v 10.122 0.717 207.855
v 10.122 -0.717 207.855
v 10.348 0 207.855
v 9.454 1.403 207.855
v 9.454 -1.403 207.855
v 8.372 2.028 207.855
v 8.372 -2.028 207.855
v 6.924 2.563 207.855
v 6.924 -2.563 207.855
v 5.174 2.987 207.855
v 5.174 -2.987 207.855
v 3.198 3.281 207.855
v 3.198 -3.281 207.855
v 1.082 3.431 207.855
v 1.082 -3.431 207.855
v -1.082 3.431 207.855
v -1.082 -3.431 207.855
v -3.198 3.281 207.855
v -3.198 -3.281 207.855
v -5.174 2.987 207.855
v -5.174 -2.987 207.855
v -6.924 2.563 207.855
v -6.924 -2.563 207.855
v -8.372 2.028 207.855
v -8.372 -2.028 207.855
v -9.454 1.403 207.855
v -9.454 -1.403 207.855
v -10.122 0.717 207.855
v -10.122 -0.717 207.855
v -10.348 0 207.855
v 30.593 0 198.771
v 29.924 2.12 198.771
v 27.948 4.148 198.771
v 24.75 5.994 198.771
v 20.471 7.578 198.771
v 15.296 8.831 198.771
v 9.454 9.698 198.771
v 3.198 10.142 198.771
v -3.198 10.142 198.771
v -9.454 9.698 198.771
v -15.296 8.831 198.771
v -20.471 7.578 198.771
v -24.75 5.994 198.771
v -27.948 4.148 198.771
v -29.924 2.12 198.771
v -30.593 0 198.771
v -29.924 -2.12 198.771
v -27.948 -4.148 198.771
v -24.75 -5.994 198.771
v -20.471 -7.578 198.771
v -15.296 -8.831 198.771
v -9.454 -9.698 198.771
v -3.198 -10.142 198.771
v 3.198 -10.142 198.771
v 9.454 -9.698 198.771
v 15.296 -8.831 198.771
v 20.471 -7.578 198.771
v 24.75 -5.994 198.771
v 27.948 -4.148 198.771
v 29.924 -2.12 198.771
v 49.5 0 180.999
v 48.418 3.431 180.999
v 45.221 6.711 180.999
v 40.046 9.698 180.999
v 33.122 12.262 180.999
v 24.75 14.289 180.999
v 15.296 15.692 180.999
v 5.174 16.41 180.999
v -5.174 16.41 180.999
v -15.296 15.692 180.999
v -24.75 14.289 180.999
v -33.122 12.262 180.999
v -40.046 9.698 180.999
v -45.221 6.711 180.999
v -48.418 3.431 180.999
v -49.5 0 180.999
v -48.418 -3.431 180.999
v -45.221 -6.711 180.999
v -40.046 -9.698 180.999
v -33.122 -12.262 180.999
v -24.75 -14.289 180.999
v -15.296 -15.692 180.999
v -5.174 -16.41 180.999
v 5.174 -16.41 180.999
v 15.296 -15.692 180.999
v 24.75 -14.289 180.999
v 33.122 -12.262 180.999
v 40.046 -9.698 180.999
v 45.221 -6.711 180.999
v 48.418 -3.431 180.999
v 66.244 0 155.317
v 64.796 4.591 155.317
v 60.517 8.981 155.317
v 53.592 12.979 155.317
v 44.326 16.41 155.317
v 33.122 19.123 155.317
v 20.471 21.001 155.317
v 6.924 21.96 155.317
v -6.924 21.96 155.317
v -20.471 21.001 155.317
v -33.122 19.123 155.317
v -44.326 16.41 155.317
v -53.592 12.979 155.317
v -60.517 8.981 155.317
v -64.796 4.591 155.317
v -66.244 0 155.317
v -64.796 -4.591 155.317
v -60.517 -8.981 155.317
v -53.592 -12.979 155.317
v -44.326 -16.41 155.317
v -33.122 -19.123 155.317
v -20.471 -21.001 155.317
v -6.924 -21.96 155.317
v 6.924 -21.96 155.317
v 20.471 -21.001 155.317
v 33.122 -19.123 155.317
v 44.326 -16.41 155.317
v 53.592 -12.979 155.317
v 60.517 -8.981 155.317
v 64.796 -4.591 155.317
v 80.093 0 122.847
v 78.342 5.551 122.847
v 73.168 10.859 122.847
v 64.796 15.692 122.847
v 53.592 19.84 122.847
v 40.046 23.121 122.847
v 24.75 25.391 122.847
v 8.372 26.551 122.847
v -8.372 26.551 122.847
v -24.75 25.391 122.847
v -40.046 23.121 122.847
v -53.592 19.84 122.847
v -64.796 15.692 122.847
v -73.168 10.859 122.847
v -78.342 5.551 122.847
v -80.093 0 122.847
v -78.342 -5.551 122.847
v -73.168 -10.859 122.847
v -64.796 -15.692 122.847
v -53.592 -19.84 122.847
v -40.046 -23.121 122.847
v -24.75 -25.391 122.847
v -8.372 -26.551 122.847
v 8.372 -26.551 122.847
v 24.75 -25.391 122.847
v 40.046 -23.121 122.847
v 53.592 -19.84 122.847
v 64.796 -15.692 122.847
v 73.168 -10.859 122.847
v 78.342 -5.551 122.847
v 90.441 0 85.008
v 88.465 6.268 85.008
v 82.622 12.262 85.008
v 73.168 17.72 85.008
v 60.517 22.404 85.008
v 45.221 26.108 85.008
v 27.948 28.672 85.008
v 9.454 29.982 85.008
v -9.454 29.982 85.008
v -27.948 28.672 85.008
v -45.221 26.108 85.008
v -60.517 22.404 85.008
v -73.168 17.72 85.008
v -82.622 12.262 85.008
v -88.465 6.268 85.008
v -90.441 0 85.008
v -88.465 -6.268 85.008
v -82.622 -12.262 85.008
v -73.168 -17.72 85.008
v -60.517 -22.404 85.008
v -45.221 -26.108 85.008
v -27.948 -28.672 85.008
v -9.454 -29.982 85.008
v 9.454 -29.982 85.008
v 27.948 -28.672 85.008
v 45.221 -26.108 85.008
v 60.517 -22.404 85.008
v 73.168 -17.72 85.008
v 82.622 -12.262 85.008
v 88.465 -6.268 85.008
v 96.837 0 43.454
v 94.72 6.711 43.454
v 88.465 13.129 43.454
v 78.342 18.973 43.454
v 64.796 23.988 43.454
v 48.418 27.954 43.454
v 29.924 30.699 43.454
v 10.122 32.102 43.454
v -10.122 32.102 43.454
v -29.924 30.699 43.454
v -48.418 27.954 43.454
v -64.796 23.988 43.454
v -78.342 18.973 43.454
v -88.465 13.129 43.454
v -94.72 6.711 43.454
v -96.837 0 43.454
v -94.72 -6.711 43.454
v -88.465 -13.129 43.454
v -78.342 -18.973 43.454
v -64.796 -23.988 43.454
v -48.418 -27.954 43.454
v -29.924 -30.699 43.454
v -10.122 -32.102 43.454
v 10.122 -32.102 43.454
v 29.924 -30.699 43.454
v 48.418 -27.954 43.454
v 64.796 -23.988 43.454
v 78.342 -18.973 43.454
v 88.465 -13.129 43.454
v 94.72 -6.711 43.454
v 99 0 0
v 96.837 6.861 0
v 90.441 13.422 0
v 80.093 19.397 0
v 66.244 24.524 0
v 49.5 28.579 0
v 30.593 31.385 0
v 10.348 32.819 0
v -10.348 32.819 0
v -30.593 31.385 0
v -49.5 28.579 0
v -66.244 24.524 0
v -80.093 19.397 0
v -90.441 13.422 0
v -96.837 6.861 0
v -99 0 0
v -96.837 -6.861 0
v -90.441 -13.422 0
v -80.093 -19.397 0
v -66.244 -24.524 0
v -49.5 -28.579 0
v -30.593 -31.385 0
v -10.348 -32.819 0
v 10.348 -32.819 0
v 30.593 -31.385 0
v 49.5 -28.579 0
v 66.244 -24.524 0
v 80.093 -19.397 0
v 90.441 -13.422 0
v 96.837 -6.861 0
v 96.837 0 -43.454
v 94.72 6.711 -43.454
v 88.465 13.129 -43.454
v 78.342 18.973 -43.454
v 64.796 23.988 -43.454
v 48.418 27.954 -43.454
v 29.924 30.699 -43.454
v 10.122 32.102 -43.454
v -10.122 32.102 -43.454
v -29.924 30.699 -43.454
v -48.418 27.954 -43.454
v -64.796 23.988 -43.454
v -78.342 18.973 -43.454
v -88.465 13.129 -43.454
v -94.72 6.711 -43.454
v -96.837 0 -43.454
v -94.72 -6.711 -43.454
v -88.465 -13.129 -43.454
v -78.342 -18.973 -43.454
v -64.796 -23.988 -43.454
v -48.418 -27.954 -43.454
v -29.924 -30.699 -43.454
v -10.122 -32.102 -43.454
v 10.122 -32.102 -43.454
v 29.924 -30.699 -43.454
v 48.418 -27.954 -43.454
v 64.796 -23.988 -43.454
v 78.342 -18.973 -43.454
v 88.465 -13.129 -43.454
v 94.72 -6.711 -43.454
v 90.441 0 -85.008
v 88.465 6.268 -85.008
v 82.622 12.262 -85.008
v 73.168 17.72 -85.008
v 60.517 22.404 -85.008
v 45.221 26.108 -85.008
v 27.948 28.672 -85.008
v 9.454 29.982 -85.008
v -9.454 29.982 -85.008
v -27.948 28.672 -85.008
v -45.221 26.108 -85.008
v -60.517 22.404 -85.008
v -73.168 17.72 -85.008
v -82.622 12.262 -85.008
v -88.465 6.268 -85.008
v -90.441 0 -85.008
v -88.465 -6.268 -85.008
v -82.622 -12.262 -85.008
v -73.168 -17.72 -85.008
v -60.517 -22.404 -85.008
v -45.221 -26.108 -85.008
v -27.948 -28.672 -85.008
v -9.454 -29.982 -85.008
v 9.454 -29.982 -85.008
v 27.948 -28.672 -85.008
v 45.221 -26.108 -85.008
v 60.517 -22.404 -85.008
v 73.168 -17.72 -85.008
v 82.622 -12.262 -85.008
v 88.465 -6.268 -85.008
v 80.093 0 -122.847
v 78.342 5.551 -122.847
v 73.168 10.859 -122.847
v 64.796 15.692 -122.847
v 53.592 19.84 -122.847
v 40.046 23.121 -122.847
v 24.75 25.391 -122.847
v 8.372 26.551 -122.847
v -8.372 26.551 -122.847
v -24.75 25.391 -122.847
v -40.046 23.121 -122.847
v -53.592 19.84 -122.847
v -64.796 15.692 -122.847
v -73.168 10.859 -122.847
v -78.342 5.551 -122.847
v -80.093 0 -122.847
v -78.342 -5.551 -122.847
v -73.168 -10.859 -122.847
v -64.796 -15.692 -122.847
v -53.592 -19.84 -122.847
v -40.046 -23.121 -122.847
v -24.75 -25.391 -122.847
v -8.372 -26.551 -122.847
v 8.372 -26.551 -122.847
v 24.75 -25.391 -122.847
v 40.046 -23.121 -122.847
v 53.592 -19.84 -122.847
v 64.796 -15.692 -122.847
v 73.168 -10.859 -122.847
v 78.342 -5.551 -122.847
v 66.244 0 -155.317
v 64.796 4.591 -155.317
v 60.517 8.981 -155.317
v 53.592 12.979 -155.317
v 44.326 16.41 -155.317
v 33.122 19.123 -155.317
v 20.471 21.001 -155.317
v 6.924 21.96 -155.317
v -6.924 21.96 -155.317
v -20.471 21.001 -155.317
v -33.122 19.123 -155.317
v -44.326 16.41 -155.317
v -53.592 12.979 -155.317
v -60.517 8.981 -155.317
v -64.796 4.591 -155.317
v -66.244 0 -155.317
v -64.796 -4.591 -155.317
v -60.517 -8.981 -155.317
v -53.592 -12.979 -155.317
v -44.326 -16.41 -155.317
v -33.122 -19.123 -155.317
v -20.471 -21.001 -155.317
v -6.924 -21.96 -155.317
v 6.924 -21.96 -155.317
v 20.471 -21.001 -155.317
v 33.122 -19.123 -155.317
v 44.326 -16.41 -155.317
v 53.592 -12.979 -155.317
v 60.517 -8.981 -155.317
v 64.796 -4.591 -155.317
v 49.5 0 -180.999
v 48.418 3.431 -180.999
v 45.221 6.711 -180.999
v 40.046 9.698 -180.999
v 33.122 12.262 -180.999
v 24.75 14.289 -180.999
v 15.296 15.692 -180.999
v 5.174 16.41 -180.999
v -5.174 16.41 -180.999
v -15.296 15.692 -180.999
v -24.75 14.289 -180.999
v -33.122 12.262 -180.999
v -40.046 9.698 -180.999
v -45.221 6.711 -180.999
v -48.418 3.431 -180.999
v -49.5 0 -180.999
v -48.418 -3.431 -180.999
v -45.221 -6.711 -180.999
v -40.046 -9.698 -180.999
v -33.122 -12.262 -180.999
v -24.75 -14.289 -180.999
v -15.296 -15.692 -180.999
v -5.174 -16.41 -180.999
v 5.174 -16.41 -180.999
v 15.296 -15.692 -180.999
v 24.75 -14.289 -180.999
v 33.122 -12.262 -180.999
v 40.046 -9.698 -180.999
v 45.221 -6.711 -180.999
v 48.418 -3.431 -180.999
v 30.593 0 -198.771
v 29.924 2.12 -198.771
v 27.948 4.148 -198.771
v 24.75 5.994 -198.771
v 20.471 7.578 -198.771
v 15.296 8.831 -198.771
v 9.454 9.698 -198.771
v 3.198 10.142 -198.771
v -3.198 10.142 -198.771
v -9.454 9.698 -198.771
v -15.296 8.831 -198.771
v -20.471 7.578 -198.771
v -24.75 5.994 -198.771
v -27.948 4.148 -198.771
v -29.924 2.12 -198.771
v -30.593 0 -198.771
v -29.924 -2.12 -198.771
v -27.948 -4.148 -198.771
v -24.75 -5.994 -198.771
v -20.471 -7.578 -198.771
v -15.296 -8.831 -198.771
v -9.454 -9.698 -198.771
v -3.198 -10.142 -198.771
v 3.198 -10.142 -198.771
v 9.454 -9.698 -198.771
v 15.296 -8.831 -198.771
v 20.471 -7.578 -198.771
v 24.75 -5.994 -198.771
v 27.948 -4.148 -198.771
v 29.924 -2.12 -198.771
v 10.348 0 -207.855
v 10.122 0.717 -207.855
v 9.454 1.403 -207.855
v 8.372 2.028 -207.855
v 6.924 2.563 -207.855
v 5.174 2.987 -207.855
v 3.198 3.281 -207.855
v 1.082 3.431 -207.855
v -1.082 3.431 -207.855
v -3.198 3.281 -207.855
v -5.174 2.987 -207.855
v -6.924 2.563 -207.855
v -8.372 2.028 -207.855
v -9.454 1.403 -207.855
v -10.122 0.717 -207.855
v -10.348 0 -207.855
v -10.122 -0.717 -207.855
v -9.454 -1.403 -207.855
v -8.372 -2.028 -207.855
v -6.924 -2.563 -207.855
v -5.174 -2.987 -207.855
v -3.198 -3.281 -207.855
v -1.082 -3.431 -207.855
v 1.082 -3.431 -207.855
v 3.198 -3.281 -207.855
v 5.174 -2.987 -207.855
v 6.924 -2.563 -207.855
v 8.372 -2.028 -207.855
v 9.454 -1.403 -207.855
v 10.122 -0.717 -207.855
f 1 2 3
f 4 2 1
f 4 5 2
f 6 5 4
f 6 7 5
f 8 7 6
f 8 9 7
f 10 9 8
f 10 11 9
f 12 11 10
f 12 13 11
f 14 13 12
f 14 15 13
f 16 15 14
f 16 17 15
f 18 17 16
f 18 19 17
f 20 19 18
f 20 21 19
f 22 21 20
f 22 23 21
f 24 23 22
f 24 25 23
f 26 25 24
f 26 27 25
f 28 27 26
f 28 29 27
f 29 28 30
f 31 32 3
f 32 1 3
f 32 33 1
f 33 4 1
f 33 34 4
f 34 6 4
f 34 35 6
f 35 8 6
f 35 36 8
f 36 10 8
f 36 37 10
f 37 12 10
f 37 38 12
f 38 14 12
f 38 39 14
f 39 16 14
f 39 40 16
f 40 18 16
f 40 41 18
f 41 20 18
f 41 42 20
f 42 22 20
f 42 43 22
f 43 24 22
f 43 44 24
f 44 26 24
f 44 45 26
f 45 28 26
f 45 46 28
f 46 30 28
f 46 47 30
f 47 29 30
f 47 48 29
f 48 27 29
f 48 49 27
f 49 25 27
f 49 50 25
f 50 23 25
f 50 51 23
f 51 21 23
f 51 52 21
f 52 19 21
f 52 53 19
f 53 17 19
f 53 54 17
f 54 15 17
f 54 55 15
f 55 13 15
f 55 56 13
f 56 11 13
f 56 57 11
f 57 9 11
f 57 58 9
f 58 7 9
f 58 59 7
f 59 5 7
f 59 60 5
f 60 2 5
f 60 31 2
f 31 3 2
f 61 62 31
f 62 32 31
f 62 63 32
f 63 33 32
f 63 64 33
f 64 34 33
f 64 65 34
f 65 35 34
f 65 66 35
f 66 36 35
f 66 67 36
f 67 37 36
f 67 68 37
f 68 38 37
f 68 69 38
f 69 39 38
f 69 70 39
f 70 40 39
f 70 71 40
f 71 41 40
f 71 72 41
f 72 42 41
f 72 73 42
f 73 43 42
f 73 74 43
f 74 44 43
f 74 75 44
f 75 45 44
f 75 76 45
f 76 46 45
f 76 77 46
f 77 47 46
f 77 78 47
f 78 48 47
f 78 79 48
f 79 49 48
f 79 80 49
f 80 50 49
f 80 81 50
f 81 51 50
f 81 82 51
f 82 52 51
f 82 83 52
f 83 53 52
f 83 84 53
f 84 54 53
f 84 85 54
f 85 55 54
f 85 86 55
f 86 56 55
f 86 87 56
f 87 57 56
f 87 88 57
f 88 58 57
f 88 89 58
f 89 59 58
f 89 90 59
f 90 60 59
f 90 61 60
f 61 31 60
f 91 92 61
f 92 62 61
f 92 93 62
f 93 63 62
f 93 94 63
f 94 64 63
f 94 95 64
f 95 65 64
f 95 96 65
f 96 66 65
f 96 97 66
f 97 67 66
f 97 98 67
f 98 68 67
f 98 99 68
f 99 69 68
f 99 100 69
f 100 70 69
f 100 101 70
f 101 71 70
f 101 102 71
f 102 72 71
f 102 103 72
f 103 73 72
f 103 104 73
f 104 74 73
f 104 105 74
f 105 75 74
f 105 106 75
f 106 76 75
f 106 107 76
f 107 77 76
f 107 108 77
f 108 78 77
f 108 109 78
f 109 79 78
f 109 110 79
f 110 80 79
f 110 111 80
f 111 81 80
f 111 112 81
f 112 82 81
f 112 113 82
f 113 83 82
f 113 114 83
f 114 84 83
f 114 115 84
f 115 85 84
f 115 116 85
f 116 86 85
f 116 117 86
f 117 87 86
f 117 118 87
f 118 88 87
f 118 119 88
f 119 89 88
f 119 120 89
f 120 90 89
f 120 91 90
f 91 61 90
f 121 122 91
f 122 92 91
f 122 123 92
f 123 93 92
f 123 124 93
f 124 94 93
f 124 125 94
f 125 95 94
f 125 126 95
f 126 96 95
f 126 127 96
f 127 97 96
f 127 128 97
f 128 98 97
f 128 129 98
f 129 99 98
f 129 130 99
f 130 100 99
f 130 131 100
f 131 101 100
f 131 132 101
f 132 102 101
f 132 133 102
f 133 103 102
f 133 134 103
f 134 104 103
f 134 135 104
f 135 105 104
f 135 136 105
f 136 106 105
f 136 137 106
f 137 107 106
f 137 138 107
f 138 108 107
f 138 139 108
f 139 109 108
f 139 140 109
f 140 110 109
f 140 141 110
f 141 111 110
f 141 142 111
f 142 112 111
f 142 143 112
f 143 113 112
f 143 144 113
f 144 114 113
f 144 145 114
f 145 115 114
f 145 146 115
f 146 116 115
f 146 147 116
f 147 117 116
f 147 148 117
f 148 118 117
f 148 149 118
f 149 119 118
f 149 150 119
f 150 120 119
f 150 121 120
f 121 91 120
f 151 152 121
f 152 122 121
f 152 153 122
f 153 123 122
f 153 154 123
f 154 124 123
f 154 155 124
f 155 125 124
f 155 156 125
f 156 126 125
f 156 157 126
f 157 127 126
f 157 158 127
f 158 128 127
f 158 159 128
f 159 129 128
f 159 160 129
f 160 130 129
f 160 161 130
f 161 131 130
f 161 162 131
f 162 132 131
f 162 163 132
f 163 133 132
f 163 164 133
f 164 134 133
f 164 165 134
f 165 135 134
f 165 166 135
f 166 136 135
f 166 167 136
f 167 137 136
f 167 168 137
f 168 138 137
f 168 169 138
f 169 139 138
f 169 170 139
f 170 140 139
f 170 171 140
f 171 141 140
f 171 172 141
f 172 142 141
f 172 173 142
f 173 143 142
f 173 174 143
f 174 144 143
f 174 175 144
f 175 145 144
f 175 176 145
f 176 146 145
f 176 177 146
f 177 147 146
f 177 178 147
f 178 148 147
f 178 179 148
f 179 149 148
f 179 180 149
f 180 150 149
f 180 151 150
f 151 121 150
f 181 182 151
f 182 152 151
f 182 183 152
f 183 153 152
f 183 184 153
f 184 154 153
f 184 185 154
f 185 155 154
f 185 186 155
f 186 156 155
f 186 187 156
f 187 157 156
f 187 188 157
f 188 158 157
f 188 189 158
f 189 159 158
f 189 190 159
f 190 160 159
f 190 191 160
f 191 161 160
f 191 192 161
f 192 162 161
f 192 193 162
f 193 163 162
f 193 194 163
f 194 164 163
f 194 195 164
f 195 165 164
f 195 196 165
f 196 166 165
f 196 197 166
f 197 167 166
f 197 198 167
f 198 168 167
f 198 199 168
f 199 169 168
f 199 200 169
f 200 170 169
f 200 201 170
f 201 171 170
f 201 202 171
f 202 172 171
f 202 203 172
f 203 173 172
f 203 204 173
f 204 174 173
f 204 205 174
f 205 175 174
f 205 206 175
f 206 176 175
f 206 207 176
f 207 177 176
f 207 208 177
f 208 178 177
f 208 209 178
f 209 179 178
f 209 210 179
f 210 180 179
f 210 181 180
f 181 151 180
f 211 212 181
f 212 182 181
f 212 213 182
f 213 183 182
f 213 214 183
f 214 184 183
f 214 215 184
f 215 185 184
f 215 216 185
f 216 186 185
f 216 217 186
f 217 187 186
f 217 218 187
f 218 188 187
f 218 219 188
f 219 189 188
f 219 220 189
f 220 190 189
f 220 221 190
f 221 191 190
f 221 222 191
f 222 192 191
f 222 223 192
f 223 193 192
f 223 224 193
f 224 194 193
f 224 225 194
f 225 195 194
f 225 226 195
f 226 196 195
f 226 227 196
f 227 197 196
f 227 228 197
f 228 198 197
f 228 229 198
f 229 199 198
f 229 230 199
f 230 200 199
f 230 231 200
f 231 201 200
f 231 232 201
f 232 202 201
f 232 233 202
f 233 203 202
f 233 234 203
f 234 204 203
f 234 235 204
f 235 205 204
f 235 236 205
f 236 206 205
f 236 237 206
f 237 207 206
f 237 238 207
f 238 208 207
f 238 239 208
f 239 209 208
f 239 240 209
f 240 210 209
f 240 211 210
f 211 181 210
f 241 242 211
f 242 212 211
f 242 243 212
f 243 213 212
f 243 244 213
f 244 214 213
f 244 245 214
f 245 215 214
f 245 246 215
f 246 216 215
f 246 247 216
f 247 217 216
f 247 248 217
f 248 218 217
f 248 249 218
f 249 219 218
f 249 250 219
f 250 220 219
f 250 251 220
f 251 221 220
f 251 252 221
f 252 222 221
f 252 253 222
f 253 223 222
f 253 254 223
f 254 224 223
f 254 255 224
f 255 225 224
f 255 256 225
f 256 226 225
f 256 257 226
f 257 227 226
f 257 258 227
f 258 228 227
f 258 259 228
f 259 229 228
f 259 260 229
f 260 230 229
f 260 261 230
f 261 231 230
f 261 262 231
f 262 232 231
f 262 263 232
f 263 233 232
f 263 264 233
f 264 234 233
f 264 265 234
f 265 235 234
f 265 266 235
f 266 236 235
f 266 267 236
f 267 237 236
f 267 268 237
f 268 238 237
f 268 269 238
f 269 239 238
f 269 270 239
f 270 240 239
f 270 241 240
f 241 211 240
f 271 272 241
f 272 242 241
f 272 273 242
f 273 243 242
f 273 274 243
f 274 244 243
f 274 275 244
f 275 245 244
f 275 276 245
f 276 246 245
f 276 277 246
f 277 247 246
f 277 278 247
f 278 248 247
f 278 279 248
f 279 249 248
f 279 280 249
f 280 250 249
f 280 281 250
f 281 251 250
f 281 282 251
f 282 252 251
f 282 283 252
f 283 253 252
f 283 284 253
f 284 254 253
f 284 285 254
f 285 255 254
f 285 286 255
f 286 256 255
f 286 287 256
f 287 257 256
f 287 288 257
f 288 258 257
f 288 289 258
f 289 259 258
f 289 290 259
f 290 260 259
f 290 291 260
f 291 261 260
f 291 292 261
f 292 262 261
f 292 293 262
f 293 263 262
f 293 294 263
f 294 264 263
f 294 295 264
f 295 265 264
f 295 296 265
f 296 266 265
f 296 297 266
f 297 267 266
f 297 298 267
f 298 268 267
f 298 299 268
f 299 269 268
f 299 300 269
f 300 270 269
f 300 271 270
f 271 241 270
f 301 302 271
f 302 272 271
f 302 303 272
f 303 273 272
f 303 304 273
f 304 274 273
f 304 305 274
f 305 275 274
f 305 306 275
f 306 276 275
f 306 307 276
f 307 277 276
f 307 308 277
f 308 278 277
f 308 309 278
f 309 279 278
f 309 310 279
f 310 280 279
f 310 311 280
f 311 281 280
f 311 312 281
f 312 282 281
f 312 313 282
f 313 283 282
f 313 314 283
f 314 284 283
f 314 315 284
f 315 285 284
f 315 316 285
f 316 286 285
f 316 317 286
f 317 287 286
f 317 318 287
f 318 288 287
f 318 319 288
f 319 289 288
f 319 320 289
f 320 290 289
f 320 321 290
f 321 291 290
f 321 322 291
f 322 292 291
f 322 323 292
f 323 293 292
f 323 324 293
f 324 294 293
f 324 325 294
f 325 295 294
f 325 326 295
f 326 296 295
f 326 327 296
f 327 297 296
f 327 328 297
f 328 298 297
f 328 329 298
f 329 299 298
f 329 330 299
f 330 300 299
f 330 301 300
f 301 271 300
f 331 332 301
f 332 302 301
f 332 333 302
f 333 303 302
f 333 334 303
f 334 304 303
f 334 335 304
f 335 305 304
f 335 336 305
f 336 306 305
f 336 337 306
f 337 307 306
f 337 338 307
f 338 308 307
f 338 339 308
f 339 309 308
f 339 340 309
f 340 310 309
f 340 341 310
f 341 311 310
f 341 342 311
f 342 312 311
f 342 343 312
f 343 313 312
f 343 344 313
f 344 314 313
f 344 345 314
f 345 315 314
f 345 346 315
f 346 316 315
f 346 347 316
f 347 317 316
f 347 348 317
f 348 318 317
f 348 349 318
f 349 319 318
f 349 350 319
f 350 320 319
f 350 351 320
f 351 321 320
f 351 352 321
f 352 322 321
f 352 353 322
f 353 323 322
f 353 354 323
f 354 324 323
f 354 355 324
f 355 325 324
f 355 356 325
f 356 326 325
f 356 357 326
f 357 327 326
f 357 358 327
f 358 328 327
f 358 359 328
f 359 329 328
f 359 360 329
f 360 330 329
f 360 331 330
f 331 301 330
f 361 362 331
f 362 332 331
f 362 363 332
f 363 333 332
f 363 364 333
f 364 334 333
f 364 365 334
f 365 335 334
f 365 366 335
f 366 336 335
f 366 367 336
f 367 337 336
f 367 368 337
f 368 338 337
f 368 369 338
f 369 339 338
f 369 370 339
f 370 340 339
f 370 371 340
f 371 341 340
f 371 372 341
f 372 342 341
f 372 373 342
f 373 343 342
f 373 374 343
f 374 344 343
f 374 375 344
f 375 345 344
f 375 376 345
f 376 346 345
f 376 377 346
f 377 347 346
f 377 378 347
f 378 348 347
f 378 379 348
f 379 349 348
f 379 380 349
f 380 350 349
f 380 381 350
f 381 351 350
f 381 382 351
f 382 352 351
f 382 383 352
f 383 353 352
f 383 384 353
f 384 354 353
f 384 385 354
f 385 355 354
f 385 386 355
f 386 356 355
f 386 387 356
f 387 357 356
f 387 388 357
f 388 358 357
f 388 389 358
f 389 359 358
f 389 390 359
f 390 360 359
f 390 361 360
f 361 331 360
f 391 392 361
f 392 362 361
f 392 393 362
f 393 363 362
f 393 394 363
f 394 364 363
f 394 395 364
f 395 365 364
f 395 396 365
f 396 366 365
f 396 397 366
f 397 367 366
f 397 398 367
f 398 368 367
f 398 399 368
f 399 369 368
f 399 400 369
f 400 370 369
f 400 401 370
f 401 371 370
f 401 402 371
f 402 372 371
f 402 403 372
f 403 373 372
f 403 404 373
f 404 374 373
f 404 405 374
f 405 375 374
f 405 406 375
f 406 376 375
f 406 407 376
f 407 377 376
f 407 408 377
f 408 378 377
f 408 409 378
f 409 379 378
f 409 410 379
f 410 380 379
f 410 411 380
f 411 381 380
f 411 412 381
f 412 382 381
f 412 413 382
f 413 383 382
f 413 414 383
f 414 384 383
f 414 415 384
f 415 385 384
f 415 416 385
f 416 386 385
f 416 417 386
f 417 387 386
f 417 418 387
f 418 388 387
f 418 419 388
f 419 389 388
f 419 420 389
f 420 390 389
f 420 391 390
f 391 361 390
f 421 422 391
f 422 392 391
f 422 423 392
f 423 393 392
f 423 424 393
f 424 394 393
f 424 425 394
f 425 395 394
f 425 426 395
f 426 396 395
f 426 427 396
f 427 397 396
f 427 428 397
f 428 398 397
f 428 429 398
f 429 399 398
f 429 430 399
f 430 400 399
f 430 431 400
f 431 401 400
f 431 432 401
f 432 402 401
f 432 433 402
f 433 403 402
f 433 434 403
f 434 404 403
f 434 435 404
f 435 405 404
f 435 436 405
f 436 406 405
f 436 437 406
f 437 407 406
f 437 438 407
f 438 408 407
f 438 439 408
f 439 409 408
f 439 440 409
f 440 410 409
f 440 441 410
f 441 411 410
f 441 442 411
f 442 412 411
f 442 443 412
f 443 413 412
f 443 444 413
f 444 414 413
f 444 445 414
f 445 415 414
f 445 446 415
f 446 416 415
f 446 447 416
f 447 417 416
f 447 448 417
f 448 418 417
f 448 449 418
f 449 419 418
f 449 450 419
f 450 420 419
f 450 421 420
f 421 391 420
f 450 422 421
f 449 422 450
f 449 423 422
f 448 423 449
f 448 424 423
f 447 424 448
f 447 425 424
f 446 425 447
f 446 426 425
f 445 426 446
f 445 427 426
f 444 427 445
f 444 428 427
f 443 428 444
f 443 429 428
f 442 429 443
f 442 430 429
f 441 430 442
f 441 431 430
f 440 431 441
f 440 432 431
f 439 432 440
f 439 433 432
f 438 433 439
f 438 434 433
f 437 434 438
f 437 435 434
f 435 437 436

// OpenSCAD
// Generated by SolidPython 1.0.1 on 2020-07-29 00:46:48


scale(v = [9, 3, 19]) {
	sphere(r = 11);
}
/***********************************************
*********      SolidPython code:      **********
************************************************
 
# import packages: SolidPython
from solid import *
from solid.utils import *
from itertools import chain, combinations, permutations


class Resize:

    def __init__(self, scad_file):
        self.scad_file = scad_file
        #self.scad_file = import_scad(scad_file)
        # cone/cylinder param:
        self.r1 = 0
        self.r2 = 0
        self.h = 0
        # rectangular prism param:
        self.w = 0
        self.l = 0
        # ellipse param:
        self.r = 0

    # import OpenScad code (file name corresponds to shape)


    # classify shape + parameters
    def assign(self, param1, param2, param3):
        if self.scad_file == 'cone.scad':
            self.r1 = param1
            self.r2 = param2
            self.h = param3
        elif self.scad_file == 'cylinder.scad':
            self.r1 = param1
            self.r2 = param2
            self.h = param3
        elif self.scad_file == 'rectangularPrism.scad':
            self.h = param1
            self.l = param2
            self.w = param3
        else:
            self.r = param1
            self.h = param2

    # resize parameters
    def iterate(self):
        x = range(3, 20, 2)
        i = 1
        if self.scad_file == 'cone.scad':
            tempList = list(permutations(x, 2))
            for temp in tempList:
                param1 = temp[0]
                param2 = temp[1]
                filepath = 'produced_scad_files/' + 'cone' + str(param1) + '_' + str(param2) + '_' + '.scad'
                scad_render_to_file(cylinder(h=param1, r1=param2, r2=0), filepath)

        elif self.scad_file == 'cylinder.scad':
            tempList = list(permutations(x, 3))
            for temp in tempList:
                param1 = temp[0]
                param2 = temp[1]
                filepath = 'produced_scad_files/' + 'cylinder' + str(param1) + '_' + str(param2) + '_' + '.scad'
                scad_render_to_file(cylinder(h=param1, r1=param2, r2=param2), filepath)

        elif self.scad_file == 'rectangularPrism.scad':
            tempList = list(permutations(x, 3))
            for temp in tempList:
                param1 = temp[0]
                param2 = temp[1]
                param3 = temp[2]
                filepath = 'produced_scad_files/' + 'rectangularPrism' + str(param1) + '_' + str(param2) + '_' + str(
                    param3) + '.scad'
                scad_render_to_file(cube(size=(param1, param2, param3)), filepath)

        elif self.scad_file == 'ellipse.scad':
            tempList = list(permutations(x, 4))
            for temp in tempList:
                param1 = temp[0]
                param2 = temp[1]
                param3 = temp[2]
                param4 = temp[3]
                filepath = 'produced_scad_files/' + 'ellipse' + str(param1) + '_' + str(param2) + '_' + str(param3) + '_' + str(param4) + '.scad'
                scad_render_to_file(scale([param1, param2, param3])(sphere(r=param4)), filepath)

    def render_to_scadfile(self):
        scad_render_to_file(scad, 'example.scad') 
 
************************************************/
